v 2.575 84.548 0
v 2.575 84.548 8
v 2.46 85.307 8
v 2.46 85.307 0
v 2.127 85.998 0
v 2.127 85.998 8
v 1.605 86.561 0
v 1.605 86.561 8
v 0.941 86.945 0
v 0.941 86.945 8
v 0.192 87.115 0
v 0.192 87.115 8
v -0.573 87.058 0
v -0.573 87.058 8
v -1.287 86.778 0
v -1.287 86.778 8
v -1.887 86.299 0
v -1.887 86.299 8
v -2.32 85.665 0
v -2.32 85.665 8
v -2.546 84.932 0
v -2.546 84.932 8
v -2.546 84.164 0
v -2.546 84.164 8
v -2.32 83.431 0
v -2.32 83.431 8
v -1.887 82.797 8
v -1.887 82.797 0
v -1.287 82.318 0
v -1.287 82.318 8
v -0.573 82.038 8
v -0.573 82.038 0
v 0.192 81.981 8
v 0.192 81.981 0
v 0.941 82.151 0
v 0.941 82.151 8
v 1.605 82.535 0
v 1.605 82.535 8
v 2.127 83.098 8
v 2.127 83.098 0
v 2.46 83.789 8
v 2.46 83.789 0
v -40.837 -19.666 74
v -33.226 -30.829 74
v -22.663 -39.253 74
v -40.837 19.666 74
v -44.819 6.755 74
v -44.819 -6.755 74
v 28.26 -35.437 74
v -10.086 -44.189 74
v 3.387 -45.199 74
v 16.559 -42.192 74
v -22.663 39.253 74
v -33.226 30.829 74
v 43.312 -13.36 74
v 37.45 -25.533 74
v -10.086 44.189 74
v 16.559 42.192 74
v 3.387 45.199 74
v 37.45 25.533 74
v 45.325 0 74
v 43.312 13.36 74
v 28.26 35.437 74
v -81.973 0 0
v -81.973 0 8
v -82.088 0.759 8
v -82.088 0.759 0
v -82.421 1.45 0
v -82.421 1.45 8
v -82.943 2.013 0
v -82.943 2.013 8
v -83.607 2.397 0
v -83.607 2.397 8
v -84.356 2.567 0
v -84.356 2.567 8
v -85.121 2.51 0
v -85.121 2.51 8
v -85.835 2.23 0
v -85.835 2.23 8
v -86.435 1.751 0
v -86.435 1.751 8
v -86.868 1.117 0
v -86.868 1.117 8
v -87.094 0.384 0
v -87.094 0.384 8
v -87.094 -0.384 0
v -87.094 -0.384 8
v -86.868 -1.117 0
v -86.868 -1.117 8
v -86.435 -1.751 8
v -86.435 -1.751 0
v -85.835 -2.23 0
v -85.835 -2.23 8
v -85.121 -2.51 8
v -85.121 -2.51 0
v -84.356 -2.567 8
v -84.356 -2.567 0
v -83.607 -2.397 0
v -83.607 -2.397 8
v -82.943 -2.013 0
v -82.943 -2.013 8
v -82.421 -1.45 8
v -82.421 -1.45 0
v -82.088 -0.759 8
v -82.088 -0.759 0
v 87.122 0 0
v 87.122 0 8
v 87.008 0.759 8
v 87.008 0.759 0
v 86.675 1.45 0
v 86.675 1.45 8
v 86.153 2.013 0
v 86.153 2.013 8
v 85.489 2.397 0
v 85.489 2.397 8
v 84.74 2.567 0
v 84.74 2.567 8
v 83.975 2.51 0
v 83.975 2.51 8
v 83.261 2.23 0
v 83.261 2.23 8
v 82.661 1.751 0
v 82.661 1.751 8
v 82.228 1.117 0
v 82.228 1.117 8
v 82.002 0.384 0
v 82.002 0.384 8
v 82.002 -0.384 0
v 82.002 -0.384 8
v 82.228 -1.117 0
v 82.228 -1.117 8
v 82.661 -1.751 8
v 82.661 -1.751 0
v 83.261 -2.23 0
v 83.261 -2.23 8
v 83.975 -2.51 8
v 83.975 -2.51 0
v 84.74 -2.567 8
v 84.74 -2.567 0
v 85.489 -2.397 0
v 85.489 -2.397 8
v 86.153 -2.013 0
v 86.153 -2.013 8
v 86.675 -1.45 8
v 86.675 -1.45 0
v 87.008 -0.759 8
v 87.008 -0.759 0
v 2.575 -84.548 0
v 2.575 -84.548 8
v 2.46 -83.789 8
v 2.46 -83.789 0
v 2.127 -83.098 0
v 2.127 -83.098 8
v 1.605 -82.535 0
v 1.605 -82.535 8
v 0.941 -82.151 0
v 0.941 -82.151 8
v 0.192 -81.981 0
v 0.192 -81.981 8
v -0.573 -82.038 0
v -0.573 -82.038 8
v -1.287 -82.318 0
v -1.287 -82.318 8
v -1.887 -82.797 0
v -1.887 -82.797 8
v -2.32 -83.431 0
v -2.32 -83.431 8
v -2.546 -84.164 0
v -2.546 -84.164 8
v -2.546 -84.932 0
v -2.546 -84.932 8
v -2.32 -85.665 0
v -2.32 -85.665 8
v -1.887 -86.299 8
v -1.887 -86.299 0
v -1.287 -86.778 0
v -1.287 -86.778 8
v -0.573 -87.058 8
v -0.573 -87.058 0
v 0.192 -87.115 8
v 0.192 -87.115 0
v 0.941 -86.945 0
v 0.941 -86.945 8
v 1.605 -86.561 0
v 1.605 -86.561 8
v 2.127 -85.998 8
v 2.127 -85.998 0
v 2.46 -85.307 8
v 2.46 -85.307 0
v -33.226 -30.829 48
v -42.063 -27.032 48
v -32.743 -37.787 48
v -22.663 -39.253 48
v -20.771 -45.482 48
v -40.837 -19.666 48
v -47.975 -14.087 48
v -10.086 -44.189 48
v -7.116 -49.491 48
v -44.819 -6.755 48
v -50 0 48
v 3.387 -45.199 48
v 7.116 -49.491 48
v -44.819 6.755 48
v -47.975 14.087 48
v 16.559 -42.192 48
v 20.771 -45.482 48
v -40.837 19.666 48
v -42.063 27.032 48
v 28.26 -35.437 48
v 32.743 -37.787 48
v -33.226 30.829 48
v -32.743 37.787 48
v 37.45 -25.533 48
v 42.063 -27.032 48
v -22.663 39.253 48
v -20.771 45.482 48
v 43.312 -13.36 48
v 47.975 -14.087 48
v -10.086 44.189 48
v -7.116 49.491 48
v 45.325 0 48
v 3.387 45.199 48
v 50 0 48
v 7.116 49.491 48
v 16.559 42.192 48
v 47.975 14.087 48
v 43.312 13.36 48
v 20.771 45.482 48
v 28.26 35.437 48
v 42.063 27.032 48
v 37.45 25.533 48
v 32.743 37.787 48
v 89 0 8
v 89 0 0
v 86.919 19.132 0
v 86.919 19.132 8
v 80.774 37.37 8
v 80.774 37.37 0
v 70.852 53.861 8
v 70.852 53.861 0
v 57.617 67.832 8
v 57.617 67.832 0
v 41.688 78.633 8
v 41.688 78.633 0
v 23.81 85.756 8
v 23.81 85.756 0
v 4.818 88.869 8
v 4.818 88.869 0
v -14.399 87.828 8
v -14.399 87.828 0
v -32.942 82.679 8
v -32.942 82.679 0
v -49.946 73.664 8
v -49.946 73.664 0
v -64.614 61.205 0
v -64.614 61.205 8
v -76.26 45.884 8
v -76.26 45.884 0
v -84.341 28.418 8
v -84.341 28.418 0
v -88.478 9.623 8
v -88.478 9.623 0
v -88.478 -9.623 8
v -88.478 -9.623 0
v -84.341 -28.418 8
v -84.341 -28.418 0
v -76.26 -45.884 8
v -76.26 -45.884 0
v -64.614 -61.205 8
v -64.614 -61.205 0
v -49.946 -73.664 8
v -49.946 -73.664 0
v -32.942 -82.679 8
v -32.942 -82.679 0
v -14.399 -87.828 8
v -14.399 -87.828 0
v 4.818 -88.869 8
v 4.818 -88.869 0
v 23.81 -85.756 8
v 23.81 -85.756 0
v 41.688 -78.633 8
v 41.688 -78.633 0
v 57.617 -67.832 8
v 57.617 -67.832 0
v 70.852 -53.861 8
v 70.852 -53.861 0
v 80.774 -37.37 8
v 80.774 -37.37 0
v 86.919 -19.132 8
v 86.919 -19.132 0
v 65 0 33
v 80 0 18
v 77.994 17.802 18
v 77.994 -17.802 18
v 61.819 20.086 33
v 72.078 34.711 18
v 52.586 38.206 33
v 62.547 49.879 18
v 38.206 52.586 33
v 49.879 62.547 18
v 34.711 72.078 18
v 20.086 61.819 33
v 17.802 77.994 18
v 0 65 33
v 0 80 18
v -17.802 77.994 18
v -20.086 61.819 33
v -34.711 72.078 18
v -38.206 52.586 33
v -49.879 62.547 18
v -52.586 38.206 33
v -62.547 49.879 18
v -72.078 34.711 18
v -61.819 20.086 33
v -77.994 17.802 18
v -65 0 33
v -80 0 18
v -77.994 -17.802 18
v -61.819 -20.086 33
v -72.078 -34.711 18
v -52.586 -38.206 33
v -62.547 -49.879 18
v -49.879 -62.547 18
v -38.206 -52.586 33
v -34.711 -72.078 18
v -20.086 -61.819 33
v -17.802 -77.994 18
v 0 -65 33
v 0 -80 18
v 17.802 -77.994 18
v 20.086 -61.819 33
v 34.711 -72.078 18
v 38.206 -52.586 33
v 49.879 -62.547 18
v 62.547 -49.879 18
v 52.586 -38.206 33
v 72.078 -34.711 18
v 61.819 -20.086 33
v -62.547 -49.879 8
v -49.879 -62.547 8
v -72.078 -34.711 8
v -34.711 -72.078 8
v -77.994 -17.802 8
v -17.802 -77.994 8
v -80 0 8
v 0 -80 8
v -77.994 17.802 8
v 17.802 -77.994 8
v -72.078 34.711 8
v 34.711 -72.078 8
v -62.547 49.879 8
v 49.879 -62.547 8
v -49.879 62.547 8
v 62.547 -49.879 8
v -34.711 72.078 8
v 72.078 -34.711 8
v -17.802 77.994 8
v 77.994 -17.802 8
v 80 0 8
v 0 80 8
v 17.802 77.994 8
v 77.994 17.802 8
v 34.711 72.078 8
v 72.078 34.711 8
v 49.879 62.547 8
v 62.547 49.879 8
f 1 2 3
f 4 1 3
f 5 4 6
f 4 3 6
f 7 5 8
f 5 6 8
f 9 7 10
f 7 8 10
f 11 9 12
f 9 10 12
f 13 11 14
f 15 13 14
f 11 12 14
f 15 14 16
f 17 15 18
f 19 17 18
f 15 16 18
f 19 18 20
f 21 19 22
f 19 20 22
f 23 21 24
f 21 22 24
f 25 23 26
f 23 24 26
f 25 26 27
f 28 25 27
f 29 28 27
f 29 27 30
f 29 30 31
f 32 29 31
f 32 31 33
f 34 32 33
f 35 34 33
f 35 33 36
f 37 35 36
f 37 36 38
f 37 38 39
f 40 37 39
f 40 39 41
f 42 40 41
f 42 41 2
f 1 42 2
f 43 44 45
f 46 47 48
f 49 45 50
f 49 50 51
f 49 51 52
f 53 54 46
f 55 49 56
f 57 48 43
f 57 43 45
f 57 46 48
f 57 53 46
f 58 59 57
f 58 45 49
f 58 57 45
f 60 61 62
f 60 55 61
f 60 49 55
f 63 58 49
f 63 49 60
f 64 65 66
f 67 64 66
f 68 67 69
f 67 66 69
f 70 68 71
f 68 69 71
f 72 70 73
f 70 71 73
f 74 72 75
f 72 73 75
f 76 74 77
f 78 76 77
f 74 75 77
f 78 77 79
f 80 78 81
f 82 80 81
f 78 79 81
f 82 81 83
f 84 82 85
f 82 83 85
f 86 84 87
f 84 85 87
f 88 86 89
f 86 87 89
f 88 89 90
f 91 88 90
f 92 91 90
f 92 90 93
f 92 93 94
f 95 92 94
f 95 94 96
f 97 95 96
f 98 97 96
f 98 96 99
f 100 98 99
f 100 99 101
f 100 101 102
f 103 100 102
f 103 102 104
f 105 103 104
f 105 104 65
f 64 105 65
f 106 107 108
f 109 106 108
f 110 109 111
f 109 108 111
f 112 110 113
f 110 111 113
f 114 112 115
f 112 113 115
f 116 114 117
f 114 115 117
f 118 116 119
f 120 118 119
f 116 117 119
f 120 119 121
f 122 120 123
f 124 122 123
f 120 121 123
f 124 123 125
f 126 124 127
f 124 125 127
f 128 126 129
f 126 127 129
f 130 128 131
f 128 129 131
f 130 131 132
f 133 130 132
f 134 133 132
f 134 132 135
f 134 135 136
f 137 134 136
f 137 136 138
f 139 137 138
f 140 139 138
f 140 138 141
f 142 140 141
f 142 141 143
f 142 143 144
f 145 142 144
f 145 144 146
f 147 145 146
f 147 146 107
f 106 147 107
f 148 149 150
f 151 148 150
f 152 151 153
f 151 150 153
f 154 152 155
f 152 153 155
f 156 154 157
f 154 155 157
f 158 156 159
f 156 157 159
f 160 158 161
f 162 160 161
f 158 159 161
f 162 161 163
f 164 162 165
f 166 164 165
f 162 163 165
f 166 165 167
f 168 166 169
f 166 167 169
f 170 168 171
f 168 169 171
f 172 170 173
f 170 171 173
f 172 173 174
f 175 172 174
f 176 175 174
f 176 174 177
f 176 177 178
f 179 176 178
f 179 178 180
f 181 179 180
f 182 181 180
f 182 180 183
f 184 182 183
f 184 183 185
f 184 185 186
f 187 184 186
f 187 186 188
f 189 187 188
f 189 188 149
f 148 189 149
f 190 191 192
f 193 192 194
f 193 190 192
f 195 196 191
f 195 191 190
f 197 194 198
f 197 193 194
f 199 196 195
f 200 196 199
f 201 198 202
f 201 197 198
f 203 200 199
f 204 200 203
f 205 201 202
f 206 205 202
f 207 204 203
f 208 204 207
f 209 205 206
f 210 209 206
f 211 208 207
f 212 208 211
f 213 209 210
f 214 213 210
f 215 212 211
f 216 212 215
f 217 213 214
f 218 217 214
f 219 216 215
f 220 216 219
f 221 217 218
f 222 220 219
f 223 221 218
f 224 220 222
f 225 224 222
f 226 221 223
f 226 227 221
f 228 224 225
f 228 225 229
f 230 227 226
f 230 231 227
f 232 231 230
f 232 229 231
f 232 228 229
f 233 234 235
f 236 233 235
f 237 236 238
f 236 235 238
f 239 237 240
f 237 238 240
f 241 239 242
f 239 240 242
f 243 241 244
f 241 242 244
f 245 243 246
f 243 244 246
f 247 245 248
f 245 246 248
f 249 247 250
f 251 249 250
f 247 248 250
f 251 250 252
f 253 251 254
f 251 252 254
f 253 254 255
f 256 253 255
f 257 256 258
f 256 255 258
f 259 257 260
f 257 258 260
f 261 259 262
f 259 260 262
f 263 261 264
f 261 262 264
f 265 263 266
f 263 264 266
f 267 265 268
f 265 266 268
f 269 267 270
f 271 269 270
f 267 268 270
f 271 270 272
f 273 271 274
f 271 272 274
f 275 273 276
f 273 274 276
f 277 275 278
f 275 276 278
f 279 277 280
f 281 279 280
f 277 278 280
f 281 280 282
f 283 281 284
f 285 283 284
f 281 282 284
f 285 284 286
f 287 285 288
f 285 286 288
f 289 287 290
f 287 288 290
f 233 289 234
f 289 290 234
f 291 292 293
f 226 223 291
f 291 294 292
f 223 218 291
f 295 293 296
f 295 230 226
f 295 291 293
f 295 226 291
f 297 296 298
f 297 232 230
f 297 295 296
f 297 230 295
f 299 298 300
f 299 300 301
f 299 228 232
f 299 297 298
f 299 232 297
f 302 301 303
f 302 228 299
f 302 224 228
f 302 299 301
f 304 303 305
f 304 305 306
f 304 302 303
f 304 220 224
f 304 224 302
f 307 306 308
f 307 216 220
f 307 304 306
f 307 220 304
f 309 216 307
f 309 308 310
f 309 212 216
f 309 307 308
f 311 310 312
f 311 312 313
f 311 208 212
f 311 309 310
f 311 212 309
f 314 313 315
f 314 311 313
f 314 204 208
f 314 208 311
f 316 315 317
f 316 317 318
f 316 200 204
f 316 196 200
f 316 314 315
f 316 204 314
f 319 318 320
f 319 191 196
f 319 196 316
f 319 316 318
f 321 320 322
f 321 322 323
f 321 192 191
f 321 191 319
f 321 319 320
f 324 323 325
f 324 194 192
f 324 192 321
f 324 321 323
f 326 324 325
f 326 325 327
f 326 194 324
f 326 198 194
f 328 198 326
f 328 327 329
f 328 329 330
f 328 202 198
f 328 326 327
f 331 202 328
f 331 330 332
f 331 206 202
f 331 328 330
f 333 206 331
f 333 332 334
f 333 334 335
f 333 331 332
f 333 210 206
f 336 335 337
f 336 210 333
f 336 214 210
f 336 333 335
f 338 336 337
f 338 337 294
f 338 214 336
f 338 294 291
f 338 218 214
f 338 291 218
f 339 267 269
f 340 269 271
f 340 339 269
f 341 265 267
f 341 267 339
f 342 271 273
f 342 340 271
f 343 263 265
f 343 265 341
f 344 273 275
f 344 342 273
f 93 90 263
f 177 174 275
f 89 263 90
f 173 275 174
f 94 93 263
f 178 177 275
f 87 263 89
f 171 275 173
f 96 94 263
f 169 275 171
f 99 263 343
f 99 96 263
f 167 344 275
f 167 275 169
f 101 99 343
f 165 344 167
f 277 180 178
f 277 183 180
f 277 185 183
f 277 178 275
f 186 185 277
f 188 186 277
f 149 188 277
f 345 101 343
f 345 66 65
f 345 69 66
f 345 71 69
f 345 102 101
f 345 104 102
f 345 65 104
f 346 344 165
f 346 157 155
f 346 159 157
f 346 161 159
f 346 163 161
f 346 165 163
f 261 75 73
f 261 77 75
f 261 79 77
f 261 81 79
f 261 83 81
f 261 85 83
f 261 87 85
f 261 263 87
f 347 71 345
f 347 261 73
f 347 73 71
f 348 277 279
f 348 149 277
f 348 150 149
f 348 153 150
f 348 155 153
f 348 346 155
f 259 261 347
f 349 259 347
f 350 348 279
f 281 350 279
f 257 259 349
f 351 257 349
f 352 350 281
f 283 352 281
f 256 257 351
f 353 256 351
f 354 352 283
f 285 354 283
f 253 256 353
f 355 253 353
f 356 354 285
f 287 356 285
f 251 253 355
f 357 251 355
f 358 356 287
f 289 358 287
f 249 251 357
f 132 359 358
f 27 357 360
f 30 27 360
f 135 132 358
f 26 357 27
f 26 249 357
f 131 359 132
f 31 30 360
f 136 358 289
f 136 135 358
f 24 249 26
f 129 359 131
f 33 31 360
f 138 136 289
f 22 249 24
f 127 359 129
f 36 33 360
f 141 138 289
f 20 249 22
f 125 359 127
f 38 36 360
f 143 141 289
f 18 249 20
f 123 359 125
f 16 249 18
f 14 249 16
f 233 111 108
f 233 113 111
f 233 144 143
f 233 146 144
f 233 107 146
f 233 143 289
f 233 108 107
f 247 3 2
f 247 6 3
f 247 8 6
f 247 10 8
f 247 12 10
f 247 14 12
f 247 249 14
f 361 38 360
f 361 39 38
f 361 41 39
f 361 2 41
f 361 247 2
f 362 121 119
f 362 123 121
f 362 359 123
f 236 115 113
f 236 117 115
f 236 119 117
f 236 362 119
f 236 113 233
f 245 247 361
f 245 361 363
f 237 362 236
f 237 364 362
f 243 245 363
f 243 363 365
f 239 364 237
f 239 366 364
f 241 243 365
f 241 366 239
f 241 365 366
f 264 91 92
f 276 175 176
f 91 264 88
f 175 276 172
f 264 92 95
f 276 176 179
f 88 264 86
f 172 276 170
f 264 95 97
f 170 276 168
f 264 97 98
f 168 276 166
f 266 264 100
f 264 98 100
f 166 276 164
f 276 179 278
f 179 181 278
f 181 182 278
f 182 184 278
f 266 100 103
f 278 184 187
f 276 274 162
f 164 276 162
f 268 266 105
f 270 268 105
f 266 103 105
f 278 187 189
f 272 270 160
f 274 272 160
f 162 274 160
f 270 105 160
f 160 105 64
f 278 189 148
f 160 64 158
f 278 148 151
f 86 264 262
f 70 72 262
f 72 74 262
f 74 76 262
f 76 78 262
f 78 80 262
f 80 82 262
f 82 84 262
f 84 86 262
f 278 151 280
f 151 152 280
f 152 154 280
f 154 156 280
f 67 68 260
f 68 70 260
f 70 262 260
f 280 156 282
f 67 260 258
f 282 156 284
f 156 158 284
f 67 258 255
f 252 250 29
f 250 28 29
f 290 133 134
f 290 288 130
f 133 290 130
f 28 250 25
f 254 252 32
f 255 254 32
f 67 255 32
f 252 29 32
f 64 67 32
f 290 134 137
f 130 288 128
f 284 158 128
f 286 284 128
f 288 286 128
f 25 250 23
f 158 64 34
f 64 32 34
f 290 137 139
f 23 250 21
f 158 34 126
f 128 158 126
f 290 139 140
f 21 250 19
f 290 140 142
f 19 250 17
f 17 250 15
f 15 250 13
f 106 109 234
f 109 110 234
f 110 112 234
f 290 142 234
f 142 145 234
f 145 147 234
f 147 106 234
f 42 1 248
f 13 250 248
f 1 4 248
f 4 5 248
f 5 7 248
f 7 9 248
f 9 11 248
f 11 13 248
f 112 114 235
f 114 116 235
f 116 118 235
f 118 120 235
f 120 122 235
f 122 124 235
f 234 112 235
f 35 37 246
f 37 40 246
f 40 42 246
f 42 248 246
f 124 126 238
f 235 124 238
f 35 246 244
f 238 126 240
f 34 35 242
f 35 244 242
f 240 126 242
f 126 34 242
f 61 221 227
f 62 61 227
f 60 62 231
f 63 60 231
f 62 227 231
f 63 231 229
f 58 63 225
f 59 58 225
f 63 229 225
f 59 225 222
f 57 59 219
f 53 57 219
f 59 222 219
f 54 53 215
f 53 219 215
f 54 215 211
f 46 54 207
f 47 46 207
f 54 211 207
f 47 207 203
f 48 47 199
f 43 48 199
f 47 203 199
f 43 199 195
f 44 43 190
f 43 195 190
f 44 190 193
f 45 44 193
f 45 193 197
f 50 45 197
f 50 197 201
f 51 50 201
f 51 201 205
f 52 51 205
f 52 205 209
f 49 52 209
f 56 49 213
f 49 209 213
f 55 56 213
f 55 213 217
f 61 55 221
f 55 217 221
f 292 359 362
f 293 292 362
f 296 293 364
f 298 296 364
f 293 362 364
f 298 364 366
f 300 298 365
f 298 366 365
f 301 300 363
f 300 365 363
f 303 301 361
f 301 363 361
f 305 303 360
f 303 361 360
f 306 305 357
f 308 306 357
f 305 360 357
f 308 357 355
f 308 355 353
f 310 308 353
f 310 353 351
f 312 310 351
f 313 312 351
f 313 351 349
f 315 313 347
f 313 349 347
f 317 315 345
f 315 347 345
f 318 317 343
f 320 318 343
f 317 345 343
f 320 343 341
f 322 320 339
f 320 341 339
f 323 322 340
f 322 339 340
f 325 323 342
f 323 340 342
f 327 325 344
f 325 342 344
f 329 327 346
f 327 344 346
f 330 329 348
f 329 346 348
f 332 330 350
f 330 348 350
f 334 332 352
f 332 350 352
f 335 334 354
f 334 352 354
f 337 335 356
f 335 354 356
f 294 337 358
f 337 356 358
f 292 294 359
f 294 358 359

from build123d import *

# Parameters (mm, degrees)
SKETCH1_R           = 89
BOSS_EXTRUDE1_DEPTH = 8
SKETCH2_R           = 80
BOSS_EXTRUDE2_DEPTH = 40
CHAMFER2_SIZE       = 30
SKETCH5_R           = 45.325276546
BOSS_EXTRUDE3_DEPTH = 26
SKETCH6_R           = 2.574541915
CUT_EXTRUDE1_DEPTH  = 26


with BuildPart() as part:
    # Sketch1 → Boss-Extrude1 (new body)
    with BuildSketch(Plane.XY):
        Circle(SKETCH1_R)
    extrude(amount=BOSS_EXTRUDE1_DEPTH)

    # Sketch2 → Boss-Extrude2 (add)
    with BuildSketch(Plane.XY.offset(8)):
        Circle(SKETCH2_R)
    extrude(amount=BOSS_EXTRUDE2_DEPTH)

    # Chamfer2
    chamfer2_edges = [part.edges().sort_by_distance(p)[0] for p in [
        (-80, 0, 48),
    ]]
    chamfer(chamfer2_edges, length=CHAMFER2_SIZE)

    # Sketch5 → Boss-Extrude3 (add)
    with BuildSketch(Plane.XY.offset(48)):
        Circle(SKETCH5_R)
    extrude(amount=BOSS_EXTRUDE3_DEPTH)

    # Sketch6 → Cut-Extrude1 (cut)
    with BuildSketch(Plane.XY.offset(8)):
        with Locations((0, 84.547956484)):
            Circle(SKETCH6_R)
        with Locations((84.547956484, 0)):
            Circle(SKETCH6_R)
        with Locations((0, -84.547956484)):
            Circle(SKETCH6_R)
        with Locations((-84.547956484, 0)):
            Circle(SKETCH6_R)
    extrude(amount=-CUT_EXTRUDE1_DEPTH, mode=Mode.SUBTRACT)


solid = part.part
